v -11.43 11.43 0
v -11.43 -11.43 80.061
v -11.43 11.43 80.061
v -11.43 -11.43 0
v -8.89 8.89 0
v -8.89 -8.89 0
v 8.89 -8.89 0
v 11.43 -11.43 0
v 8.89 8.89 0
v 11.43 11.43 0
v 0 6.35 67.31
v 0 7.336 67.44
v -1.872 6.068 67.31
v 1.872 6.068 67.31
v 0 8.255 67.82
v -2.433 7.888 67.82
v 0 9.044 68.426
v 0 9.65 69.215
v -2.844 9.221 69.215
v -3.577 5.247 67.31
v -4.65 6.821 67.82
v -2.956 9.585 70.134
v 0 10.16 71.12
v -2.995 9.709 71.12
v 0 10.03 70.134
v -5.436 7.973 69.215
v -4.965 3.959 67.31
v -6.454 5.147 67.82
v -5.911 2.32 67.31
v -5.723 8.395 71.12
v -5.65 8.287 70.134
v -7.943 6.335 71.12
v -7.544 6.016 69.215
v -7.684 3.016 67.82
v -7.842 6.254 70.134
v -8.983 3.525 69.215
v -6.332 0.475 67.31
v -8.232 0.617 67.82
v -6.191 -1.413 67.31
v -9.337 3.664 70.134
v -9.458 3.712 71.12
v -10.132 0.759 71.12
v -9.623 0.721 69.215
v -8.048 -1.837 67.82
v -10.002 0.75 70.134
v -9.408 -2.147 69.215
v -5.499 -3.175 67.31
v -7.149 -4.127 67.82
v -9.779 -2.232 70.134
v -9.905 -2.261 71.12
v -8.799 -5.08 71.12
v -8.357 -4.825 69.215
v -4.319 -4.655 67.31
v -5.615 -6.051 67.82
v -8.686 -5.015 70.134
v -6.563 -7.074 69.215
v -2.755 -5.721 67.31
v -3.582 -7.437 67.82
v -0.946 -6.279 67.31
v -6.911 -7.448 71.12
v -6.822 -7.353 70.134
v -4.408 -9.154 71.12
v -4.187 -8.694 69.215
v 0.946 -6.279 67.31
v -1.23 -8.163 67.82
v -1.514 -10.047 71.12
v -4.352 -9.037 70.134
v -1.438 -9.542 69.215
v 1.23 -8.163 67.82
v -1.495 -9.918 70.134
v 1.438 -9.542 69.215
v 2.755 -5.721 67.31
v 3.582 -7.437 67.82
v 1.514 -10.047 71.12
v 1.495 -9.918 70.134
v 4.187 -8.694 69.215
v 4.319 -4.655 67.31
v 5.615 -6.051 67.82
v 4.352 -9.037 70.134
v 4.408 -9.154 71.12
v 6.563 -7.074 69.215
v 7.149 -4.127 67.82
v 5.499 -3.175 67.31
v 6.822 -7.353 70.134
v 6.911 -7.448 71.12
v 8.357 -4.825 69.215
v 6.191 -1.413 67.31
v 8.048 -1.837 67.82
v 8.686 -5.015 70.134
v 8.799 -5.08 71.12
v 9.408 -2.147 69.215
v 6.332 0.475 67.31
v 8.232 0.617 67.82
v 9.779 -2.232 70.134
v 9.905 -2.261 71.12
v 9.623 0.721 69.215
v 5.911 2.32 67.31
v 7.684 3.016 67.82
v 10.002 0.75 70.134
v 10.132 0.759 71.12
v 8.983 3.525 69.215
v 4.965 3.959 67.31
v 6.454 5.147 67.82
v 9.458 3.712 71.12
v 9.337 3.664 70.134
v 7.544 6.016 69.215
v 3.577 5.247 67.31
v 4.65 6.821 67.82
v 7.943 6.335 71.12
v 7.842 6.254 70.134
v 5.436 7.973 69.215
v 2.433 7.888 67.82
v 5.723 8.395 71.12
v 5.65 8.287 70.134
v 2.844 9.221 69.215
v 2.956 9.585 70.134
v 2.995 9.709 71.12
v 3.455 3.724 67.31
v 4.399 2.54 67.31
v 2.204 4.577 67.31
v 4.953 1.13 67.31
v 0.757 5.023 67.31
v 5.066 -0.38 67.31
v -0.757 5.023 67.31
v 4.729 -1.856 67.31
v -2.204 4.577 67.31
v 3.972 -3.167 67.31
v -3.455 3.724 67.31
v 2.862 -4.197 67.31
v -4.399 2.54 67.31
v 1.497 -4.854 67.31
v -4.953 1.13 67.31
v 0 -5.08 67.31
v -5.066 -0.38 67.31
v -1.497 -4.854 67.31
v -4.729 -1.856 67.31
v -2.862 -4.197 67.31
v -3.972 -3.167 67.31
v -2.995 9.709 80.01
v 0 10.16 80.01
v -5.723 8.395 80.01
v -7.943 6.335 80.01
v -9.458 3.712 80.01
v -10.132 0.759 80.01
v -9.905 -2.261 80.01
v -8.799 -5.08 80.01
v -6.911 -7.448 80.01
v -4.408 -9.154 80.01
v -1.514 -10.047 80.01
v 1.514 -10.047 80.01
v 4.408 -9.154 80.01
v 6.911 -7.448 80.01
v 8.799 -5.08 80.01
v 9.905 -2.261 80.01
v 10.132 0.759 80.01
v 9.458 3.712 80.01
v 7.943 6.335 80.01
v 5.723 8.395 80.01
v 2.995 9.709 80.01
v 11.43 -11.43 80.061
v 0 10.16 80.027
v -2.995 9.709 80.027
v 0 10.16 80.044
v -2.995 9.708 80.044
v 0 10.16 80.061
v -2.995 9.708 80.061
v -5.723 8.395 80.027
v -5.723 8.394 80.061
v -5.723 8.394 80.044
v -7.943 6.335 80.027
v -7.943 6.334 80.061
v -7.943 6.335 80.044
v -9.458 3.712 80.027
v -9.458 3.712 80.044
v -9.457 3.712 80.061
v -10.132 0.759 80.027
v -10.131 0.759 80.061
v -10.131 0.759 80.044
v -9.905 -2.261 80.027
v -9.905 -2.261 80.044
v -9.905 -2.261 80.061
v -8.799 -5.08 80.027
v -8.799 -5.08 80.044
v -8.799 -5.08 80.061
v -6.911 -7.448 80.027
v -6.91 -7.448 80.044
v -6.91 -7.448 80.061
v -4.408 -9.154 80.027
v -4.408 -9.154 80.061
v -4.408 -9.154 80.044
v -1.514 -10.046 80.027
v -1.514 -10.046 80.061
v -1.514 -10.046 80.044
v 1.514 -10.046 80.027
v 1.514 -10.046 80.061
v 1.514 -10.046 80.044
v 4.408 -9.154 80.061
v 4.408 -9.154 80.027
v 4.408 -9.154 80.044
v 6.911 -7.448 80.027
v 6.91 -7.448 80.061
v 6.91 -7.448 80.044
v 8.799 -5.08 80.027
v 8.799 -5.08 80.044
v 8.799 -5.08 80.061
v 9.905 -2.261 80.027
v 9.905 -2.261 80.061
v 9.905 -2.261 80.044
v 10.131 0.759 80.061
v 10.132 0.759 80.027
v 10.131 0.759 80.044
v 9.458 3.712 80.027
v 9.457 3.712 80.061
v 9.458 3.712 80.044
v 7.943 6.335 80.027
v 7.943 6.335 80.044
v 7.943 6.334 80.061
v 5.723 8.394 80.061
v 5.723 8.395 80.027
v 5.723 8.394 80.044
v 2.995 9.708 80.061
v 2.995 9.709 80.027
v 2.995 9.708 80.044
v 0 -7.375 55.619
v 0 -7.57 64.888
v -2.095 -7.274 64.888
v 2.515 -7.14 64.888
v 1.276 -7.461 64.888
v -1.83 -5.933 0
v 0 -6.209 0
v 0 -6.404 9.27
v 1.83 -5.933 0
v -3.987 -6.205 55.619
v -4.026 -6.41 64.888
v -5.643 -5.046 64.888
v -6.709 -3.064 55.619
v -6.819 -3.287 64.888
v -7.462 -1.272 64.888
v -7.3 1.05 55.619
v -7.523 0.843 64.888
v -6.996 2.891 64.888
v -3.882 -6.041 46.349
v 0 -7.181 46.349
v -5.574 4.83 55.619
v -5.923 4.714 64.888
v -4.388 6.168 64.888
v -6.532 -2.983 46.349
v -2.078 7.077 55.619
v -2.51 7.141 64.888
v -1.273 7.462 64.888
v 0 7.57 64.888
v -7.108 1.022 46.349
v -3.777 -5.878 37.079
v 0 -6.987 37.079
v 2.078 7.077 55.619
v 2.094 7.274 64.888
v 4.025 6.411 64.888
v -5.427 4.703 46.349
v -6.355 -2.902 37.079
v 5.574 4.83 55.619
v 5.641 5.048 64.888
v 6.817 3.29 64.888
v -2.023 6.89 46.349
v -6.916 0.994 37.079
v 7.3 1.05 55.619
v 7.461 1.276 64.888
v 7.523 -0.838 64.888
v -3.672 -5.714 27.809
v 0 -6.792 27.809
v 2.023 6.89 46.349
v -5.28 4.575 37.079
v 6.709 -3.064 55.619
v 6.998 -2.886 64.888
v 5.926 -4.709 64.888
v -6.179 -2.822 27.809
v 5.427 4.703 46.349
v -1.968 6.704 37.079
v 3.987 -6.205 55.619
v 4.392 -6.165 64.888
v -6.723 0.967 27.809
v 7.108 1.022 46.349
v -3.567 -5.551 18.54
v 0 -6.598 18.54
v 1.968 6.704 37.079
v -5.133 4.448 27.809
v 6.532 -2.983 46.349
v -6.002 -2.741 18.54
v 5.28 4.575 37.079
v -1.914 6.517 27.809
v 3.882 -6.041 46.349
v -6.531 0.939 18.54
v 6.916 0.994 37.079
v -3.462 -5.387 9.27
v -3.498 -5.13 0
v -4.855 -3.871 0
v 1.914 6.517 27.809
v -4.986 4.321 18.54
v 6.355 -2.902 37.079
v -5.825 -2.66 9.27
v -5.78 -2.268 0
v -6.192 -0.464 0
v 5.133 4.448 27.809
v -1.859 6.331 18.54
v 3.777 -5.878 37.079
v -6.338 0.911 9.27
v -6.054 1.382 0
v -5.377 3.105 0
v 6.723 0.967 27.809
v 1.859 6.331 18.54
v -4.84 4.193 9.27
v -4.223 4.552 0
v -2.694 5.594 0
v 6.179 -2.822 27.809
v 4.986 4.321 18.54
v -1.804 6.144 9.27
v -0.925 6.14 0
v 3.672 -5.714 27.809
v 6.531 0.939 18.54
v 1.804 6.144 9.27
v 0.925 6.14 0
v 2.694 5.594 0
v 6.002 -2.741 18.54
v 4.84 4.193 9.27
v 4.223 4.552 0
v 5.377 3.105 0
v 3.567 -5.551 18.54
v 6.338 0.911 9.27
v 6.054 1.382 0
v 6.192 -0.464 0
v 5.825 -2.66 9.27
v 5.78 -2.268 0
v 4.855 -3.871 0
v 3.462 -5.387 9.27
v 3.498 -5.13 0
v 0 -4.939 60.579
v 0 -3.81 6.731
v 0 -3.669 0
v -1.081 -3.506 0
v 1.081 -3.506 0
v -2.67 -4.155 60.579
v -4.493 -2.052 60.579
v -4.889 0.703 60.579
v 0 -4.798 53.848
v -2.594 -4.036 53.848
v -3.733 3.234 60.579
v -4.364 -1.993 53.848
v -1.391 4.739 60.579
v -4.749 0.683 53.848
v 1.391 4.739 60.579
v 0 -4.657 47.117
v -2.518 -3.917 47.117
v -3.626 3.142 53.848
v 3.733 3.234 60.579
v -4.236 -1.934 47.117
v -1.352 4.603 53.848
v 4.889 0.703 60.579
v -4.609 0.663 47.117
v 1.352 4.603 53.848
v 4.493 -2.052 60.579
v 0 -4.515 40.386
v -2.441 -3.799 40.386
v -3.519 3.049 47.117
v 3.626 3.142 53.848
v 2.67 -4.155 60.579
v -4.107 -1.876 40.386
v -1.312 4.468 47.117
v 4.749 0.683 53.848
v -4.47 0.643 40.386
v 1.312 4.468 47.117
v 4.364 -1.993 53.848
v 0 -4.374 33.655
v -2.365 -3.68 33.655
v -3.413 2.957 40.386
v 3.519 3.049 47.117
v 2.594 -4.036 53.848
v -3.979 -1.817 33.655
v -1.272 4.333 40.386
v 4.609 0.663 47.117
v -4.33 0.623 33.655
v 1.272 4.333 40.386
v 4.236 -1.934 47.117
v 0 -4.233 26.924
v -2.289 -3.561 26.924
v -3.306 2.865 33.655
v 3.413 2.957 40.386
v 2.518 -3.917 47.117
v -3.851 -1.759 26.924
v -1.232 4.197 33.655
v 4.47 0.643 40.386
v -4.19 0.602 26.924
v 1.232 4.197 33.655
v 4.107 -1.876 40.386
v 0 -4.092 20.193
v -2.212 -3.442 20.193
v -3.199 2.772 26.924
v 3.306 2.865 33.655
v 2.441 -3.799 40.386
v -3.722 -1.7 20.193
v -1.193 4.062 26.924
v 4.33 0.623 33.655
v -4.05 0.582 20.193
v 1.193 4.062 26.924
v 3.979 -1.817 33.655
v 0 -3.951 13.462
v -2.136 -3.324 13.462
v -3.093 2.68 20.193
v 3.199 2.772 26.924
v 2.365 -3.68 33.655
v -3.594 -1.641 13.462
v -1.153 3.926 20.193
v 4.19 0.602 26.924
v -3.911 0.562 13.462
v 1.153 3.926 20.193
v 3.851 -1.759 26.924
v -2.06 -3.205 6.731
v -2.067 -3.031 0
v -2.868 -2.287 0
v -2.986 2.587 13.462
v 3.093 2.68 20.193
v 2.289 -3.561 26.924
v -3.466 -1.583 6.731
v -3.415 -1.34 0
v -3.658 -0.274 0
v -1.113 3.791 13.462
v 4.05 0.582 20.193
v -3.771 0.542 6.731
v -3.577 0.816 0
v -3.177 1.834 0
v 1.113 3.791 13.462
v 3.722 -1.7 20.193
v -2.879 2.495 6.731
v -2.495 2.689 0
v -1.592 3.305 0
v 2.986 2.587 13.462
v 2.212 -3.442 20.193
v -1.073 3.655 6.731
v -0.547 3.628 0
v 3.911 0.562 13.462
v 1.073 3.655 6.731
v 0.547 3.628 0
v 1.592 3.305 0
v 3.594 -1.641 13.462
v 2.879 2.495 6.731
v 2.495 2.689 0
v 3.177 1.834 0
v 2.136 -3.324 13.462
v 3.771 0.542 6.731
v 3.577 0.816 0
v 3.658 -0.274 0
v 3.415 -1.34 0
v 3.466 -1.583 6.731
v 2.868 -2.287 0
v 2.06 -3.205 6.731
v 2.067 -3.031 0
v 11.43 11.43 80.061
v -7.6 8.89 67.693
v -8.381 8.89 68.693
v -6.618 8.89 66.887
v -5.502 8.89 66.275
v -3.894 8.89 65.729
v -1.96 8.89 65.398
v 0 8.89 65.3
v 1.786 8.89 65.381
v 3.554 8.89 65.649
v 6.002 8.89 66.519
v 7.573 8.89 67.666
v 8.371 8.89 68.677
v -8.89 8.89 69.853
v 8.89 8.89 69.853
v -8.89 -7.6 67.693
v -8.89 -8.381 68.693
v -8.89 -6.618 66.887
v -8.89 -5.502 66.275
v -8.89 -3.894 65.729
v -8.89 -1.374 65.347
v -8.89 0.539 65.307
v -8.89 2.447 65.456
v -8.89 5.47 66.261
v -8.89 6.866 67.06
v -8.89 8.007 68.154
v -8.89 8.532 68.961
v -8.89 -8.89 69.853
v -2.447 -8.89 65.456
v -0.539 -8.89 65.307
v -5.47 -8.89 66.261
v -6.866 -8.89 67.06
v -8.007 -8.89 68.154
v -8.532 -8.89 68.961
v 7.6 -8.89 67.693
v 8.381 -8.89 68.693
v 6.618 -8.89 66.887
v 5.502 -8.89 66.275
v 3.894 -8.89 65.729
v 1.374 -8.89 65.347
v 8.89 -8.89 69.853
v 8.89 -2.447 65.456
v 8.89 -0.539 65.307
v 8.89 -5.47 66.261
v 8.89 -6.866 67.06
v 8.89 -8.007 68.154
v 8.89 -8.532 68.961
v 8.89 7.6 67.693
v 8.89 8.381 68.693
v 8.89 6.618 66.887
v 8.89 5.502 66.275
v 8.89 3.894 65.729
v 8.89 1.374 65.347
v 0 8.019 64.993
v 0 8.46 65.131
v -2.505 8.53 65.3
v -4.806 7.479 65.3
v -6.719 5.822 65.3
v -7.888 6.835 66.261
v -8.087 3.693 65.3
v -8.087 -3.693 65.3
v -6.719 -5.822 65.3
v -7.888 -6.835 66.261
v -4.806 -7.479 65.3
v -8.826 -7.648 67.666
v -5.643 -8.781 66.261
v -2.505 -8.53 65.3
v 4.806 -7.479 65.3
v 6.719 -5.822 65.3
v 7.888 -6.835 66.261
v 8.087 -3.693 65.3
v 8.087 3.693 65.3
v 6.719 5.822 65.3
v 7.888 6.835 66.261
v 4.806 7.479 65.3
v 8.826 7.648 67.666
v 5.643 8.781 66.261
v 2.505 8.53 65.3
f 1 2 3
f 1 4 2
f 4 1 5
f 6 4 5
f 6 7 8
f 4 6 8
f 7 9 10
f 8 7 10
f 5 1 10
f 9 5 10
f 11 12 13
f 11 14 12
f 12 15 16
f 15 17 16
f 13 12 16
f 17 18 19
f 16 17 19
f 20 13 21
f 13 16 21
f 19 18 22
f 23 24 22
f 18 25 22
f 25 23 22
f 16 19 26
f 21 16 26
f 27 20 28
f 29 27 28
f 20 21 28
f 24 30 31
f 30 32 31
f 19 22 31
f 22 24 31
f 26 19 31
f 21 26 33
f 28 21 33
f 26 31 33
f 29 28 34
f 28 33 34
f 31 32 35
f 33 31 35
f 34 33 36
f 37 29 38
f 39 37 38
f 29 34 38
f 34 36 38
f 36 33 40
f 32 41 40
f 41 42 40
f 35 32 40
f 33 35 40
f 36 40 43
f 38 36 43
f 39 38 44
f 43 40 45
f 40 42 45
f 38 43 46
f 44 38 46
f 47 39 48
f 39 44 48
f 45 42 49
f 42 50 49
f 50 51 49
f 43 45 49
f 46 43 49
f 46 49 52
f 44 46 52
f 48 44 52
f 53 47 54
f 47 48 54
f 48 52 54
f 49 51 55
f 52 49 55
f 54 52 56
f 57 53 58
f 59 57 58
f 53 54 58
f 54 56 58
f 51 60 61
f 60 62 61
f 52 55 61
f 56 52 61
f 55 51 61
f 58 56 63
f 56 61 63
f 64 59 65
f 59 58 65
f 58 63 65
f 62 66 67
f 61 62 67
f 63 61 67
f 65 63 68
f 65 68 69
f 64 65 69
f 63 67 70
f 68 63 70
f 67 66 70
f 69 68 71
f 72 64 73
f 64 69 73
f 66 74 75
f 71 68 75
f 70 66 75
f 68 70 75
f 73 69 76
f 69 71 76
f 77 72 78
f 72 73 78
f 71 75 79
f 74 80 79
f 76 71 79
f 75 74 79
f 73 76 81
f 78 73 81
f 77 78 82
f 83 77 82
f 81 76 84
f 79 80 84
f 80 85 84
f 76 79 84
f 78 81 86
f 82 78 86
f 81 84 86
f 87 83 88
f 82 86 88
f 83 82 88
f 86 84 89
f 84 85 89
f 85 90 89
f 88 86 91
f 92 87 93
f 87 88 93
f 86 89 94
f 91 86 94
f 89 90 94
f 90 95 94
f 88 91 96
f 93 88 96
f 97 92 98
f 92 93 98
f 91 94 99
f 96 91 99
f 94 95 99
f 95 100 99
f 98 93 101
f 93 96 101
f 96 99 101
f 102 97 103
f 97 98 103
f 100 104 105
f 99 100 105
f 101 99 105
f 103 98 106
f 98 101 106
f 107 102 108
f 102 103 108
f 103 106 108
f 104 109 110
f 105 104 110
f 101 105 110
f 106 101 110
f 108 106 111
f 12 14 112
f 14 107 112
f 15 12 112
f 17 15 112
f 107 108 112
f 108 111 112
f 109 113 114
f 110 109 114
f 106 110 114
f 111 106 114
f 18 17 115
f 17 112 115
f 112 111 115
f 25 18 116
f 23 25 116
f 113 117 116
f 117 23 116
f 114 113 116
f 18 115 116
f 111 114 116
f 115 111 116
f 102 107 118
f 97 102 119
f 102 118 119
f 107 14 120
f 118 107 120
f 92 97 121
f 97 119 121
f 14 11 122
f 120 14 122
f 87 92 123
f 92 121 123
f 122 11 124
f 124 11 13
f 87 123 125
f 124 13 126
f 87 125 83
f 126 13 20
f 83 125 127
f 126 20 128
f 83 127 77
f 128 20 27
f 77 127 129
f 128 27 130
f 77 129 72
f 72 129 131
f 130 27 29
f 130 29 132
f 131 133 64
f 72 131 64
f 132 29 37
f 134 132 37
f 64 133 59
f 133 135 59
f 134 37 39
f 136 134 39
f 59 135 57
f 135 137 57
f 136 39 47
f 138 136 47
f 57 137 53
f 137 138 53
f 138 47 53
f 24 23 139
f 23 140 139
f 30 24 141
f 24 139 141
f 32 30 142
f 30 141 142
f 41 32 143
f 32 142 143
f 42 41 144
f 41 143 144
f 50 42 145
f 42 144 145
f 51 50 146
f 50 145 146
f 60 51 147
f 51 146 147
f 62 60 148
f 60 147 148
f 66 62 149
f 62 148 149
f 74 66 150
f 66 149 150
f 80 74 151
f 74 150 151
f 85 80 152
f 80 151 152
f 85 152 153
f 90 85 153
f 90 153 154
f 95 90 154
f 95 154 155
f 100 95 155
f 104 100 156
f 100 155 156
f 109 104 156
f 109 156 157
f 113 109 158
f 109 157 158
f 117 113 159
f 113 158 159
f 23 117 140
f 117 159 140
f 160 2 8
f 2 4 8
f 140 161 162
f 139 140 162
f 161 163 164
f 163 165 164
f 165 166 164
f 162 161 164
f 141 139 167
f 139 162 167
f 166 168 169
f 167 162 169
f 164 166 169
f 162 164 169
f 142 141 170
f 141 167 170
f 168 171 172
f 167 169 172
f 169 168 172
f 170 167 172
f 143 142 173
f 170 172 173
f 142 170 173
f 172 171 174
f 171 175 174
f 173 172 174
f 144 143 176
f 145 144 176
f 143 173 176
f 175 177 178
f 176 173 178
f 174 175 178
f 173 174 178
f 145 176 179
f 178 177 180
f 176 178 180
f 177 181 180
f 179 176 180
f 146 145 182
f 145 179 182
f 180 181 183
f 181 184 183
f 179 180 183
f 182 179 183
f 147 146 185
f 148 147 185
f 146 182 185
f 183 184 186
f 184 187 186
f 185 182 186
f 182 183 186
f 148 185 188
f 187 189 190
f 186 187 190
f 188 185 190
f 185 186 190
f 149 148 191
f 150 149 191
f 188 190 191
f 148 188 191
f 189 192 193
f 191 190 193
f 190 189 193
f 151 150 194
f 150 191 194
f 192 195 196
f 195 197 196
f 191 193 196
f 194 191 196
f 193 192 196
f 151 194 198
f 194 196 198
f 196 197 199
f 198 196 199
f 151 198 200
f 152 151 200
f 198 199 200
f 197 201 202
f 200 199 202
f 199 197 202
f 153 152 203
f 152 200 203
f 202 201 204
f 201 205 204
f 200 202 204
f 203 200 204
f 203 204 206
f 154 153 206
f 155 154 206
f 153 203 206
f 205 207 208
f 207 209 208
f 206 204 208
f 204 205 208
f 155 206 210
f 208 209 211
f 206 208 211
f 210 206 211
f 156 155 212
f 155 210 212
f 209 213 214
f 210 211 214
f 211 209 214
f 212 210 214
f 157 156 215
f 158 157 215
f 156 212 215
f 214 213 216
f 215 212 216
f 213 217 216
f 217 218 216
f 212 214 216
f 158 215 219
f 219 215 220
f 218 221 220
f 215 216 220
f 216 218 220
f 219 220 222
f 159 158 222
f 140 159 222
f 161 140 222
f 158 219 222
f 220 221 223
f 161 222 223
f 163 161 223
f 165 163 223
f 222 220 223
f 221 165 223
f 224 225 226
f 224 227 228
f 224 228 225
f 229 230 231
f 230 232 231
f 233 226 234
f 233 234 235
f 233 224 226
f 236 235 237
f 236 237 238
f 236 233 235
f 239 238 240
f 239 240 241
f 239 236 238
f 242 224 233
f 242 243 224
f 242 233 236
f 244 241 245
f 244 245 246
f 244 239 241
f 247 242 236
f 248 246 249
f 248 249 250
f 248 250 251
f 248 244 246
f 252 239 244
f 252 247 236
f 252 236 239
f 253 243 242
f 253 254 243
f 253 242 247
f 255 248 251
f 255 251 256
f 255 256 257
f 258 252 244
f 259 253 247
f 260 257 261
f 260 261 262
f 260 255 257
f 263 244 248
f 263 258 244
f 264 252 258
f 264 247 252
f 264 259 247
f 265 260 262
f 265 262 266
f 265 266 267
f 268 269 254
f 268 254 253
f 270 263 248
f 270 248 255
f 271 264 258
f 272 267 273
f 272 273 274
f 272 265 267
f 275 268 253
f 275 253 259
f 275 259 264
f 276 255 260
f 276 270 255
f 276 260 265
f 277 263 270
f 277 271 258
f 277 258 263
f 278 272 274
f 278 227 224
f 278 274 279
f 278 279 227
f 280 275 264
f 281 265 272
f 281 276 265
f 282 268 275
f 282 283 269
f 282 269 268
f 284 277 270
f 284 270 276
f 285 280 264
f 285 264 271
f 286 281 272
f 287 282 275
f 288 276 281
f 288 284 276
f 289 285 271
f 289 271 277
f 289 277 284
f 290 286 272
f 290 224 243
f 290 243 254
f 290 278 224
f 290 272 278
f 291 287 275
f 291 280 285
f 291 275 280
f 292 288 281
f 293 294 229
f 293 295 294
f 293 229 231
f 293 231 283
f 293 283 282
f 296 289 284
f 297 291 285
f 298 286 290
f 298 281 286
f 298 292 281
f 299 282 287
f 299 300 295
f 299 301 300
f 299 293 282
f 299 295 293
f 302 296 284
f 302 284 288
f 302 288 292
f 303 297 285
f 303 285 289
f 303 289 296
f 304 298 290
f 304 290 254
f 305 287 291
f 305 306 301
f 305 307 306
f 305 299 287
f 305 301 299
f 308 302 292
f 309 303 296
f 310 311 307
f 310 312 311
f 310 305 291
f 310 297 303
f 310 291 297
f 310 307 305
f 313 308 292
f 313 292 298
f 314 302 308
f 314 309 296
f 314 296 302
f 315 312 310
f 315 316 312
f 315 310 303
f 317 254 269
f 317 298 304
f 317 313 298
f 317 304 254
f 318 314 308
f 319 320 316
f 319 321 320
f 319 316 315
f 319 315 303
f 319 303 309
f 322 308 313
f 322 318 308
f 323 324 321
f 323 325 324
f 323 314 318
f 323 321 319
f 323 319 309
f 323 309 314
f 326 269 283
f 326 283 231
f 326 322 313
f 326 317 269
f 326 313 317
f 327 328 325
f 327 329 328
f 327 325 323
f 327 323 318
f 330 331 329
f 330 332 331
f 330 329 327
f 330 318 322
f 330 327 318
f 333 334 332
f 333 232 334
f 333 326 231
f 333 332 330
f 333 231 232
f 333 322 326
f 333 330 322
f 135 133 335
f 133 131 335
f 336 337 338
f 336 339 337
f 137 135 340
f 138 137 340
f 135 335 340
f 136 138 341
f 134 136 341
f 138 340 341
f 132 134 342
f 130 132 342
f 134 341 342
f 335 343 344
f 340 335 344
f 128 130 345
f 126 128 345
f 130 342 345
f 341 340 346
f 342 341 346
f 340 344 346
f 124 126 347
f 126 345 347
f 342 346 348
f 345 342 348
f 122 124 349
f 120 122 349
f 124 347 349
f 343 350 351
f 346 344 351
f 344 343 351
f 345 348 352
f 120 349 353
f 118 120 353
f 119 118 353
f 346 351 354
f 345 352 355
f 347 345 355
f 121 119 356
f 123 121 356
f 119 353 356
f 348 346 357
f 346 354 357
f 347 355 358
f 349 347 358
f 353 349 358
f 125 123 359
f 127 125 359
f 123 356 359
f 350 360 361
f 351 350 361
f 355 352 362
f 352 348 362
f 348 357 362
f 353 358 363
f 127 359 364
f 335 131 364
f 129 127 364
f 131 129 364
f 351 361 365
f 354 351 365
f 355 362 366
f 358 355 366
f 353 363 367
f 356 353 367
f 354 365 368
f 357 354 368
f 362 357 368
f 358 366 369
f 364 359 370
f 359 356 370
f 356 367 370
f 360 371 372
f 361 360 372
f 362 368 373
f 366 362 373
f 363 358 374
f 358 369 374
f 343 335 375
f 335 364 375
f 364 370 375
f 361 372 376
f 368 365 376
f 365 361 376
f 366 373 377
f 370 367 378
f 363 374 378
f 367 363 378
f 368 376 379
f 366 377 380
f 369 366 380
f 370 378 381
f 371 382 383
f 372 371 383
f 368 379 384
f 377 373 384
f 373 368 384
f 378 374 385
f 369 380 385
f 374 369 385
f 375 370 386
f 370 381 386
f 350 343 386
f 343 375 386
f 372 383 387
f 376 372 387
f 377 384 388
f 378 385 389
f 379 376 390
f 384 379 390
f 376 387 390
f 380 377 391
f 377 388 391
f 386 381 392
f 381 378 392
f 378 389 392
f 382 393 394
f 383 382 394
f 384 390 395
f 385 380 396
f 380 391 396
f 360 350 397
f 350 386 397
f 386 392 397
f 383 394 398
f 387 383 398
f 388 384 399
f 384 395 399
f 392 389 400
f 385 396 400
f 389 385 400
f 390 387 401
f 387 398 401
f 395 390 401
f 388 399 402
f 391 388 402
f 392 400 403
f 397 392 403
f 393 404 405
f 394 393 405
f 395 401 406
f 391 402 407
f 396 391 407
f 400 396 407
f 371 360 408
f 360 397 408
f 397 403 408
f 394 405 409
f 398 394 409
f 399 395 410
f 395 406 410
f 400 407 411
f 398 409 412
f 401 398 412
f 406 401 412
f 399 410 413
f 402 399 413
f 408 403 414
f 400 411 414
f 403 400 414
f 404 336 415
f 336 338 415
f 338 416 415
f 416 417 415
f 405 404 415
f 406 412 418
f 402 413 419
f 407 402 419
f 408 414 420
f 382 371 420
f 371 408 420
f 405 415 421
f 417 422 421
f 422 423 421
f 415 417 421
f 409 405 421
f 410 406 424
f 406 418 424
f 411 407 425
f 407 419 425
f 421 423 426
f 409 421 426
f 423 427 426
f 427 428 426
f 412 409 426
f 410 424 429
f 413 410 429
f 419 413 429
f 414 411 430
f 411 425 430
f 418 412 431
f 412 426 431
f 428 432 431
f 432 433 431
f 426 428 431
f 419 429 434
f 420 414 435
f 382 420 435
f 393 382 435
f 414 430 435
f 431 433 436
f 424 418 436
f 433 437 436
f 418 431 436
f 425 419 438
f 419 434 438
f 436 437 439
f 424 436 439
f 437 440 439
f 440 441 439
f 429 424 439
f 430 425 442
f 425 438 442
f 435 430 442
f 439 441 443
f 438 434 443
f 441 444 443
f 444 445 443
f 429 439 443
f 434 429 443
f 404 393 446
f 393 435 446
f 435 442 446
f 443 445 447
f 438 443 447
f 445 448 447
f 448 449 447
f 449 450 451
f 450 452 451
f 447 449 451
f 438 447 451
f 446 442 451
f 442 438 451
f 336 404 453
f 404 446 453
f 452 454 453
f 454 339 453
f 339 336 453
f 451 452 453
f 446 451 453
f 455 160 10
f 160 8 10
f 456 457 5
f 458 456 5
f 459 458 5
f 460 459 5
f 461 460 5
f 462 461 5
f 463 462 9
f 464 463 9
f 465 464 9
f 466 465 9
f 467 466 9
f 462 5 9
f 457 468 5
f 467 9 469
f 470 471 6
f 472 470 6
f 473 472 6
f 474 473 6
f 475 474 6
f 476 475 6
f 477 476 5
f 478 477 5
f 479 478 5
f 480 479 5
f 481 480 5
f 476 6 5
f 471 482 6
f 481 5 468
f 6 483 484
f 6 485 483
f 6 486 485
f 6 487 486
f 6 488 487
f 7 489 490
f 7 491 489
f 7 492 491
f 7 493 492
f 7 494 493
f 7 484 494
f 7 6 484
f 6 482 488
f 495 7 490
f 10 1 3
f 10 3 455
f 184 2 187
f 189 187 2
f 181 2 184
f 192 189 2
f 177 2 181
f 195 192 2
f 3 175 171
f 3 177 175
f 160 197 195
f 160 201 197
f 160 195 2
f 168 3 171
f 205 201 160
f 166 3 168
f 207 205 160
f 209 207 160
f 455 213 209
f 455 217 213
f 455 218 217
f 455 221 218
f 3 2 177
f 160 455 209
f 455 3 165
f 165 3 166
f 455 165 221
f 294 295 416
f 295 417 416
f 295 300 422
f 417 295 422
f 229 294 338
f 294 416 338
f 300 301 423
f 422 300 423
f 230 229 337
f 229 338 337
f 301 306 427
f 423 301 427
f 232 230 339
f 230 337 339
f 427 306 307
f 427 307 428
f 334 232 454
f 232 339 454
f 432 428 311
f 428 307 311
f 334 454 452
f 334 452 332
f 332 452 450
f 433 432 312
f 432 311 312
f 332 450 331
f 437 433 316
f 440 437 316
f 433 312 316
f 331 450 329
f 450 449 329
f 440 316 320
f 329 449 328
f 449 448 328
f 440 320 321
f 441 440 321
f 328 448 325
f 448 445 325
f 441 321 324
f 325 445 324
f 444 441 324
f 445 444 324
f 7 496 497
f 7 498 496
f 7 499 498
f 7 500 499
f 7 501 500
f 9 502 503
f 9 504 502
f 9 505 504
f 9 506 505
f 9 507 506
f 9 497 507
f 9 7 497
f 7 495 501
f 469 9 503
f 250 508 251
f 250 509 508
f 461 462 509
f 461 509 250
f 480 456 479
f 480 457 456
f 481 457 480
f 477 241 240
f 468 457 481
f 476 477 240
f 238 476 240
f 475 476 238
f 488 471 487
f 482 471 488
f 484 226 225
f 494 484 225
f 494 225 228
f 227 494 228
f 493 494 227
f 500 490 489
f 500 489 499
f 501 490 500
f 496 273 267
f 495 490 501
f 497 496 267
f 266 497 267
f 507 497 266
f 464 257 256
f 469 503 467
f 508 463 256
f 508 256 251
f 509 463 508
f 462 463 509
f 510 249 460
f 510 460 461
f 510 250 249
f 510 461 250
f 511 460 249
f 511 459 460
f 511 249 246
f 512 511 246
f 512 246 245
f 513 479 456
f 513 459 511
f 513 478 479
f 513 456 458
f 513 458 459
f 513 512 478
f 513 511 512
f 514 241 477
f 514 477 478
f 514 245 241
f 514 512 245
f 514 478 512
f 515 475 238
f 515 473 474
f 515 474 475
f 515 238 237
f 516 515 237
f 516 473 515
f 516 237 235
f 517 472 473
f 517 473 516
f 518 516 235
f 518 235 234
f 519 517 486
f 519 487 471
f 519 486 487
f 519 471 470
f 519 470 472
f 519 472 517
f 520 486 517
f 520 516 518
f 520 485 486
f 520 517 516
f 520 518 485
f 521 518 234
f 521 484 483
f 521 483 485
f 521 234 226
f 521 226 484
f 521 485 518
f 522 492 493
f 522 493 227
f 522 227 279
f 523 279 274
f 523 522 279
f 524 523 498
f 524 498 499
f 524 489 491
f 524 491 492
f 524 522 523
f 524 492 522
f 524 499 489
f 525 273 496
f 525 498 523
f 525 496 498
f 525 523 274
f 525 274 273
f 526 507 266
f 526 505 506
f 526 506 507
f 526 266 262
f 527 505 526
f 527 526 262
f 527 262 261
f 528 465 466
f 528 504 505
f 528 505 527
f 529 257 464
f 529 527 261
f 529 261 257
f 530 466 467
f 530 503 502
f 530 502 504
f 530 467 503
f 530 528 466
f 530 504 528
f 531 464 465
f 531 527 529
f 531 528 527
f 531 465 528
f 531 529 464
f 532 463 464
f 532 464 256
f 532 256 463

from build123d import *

# Parameters (mm, degrees)
F0_W     = 22.86
F0_H     = 22.86
F1_DEPTH = 67.31
F2_W     = 22.86
F2_H     = 22.86
F3_DEPTH = 12.7508
F8_T     = -2.54


with BuildPart() as f1:
    # F0 (on Top) → F1 (new body)
    with BuildSketch(Plane.XY):
        Rectangle(F0_W, F0_H)
    extrude(amount=F1_DEPTH)

    # F2 (on face) → F3 (join)
    with BuildSketch(Plane.XY.offset(67.31)):
        Rectangle(F2_W, F2_H)
    extrude(amount=F3_DEPTH)

    # F4 (on Right) → F5 (revolve, cut)
    with BuildSketch(Plane.YZ):
        Polygon((0, -11.43), (0, 67.31), (-5.08, 67.31), (-3.429, -11.43), align=None)
    revolve(axis=Axis((0, 0, 27.94), (0, 0, -1)), mode=Mode.SUBTRACT)

    # F6 (on Right) → F7 (revolve, cut)
    with BuildSketch(Plane.YZ):
        with BuildLine():
            Line((0, 83.82), (0, 67.31))
            Line((0, 67.31), (6.35, 67.31))
            ThreePointArc((6.35, 67.31), (9.0440768363, 68.4259231637), (10.16, 71.12))
            Line((10.16, 71.12), (10.16, 80.01))
            ThreePointArc((10.16, 80.01), (9.0440768363, 82.7040768363), (6.35, 83.82))
            Line((6.35, 83.82), (0, 83.82))
        make_face()
    revolve(axis=Axis((0, 0, 75.565), (0, 0, 1)), mode=Mode.SUBTRACT)

    # F8
    f8_openings = [f1.faces().sort_by_distance(p)[0] for p in [
        (0, -11.106711, 0),
    ]]
    offset(amount=F8_T, openings=f8_openings)


solid = f1.part
